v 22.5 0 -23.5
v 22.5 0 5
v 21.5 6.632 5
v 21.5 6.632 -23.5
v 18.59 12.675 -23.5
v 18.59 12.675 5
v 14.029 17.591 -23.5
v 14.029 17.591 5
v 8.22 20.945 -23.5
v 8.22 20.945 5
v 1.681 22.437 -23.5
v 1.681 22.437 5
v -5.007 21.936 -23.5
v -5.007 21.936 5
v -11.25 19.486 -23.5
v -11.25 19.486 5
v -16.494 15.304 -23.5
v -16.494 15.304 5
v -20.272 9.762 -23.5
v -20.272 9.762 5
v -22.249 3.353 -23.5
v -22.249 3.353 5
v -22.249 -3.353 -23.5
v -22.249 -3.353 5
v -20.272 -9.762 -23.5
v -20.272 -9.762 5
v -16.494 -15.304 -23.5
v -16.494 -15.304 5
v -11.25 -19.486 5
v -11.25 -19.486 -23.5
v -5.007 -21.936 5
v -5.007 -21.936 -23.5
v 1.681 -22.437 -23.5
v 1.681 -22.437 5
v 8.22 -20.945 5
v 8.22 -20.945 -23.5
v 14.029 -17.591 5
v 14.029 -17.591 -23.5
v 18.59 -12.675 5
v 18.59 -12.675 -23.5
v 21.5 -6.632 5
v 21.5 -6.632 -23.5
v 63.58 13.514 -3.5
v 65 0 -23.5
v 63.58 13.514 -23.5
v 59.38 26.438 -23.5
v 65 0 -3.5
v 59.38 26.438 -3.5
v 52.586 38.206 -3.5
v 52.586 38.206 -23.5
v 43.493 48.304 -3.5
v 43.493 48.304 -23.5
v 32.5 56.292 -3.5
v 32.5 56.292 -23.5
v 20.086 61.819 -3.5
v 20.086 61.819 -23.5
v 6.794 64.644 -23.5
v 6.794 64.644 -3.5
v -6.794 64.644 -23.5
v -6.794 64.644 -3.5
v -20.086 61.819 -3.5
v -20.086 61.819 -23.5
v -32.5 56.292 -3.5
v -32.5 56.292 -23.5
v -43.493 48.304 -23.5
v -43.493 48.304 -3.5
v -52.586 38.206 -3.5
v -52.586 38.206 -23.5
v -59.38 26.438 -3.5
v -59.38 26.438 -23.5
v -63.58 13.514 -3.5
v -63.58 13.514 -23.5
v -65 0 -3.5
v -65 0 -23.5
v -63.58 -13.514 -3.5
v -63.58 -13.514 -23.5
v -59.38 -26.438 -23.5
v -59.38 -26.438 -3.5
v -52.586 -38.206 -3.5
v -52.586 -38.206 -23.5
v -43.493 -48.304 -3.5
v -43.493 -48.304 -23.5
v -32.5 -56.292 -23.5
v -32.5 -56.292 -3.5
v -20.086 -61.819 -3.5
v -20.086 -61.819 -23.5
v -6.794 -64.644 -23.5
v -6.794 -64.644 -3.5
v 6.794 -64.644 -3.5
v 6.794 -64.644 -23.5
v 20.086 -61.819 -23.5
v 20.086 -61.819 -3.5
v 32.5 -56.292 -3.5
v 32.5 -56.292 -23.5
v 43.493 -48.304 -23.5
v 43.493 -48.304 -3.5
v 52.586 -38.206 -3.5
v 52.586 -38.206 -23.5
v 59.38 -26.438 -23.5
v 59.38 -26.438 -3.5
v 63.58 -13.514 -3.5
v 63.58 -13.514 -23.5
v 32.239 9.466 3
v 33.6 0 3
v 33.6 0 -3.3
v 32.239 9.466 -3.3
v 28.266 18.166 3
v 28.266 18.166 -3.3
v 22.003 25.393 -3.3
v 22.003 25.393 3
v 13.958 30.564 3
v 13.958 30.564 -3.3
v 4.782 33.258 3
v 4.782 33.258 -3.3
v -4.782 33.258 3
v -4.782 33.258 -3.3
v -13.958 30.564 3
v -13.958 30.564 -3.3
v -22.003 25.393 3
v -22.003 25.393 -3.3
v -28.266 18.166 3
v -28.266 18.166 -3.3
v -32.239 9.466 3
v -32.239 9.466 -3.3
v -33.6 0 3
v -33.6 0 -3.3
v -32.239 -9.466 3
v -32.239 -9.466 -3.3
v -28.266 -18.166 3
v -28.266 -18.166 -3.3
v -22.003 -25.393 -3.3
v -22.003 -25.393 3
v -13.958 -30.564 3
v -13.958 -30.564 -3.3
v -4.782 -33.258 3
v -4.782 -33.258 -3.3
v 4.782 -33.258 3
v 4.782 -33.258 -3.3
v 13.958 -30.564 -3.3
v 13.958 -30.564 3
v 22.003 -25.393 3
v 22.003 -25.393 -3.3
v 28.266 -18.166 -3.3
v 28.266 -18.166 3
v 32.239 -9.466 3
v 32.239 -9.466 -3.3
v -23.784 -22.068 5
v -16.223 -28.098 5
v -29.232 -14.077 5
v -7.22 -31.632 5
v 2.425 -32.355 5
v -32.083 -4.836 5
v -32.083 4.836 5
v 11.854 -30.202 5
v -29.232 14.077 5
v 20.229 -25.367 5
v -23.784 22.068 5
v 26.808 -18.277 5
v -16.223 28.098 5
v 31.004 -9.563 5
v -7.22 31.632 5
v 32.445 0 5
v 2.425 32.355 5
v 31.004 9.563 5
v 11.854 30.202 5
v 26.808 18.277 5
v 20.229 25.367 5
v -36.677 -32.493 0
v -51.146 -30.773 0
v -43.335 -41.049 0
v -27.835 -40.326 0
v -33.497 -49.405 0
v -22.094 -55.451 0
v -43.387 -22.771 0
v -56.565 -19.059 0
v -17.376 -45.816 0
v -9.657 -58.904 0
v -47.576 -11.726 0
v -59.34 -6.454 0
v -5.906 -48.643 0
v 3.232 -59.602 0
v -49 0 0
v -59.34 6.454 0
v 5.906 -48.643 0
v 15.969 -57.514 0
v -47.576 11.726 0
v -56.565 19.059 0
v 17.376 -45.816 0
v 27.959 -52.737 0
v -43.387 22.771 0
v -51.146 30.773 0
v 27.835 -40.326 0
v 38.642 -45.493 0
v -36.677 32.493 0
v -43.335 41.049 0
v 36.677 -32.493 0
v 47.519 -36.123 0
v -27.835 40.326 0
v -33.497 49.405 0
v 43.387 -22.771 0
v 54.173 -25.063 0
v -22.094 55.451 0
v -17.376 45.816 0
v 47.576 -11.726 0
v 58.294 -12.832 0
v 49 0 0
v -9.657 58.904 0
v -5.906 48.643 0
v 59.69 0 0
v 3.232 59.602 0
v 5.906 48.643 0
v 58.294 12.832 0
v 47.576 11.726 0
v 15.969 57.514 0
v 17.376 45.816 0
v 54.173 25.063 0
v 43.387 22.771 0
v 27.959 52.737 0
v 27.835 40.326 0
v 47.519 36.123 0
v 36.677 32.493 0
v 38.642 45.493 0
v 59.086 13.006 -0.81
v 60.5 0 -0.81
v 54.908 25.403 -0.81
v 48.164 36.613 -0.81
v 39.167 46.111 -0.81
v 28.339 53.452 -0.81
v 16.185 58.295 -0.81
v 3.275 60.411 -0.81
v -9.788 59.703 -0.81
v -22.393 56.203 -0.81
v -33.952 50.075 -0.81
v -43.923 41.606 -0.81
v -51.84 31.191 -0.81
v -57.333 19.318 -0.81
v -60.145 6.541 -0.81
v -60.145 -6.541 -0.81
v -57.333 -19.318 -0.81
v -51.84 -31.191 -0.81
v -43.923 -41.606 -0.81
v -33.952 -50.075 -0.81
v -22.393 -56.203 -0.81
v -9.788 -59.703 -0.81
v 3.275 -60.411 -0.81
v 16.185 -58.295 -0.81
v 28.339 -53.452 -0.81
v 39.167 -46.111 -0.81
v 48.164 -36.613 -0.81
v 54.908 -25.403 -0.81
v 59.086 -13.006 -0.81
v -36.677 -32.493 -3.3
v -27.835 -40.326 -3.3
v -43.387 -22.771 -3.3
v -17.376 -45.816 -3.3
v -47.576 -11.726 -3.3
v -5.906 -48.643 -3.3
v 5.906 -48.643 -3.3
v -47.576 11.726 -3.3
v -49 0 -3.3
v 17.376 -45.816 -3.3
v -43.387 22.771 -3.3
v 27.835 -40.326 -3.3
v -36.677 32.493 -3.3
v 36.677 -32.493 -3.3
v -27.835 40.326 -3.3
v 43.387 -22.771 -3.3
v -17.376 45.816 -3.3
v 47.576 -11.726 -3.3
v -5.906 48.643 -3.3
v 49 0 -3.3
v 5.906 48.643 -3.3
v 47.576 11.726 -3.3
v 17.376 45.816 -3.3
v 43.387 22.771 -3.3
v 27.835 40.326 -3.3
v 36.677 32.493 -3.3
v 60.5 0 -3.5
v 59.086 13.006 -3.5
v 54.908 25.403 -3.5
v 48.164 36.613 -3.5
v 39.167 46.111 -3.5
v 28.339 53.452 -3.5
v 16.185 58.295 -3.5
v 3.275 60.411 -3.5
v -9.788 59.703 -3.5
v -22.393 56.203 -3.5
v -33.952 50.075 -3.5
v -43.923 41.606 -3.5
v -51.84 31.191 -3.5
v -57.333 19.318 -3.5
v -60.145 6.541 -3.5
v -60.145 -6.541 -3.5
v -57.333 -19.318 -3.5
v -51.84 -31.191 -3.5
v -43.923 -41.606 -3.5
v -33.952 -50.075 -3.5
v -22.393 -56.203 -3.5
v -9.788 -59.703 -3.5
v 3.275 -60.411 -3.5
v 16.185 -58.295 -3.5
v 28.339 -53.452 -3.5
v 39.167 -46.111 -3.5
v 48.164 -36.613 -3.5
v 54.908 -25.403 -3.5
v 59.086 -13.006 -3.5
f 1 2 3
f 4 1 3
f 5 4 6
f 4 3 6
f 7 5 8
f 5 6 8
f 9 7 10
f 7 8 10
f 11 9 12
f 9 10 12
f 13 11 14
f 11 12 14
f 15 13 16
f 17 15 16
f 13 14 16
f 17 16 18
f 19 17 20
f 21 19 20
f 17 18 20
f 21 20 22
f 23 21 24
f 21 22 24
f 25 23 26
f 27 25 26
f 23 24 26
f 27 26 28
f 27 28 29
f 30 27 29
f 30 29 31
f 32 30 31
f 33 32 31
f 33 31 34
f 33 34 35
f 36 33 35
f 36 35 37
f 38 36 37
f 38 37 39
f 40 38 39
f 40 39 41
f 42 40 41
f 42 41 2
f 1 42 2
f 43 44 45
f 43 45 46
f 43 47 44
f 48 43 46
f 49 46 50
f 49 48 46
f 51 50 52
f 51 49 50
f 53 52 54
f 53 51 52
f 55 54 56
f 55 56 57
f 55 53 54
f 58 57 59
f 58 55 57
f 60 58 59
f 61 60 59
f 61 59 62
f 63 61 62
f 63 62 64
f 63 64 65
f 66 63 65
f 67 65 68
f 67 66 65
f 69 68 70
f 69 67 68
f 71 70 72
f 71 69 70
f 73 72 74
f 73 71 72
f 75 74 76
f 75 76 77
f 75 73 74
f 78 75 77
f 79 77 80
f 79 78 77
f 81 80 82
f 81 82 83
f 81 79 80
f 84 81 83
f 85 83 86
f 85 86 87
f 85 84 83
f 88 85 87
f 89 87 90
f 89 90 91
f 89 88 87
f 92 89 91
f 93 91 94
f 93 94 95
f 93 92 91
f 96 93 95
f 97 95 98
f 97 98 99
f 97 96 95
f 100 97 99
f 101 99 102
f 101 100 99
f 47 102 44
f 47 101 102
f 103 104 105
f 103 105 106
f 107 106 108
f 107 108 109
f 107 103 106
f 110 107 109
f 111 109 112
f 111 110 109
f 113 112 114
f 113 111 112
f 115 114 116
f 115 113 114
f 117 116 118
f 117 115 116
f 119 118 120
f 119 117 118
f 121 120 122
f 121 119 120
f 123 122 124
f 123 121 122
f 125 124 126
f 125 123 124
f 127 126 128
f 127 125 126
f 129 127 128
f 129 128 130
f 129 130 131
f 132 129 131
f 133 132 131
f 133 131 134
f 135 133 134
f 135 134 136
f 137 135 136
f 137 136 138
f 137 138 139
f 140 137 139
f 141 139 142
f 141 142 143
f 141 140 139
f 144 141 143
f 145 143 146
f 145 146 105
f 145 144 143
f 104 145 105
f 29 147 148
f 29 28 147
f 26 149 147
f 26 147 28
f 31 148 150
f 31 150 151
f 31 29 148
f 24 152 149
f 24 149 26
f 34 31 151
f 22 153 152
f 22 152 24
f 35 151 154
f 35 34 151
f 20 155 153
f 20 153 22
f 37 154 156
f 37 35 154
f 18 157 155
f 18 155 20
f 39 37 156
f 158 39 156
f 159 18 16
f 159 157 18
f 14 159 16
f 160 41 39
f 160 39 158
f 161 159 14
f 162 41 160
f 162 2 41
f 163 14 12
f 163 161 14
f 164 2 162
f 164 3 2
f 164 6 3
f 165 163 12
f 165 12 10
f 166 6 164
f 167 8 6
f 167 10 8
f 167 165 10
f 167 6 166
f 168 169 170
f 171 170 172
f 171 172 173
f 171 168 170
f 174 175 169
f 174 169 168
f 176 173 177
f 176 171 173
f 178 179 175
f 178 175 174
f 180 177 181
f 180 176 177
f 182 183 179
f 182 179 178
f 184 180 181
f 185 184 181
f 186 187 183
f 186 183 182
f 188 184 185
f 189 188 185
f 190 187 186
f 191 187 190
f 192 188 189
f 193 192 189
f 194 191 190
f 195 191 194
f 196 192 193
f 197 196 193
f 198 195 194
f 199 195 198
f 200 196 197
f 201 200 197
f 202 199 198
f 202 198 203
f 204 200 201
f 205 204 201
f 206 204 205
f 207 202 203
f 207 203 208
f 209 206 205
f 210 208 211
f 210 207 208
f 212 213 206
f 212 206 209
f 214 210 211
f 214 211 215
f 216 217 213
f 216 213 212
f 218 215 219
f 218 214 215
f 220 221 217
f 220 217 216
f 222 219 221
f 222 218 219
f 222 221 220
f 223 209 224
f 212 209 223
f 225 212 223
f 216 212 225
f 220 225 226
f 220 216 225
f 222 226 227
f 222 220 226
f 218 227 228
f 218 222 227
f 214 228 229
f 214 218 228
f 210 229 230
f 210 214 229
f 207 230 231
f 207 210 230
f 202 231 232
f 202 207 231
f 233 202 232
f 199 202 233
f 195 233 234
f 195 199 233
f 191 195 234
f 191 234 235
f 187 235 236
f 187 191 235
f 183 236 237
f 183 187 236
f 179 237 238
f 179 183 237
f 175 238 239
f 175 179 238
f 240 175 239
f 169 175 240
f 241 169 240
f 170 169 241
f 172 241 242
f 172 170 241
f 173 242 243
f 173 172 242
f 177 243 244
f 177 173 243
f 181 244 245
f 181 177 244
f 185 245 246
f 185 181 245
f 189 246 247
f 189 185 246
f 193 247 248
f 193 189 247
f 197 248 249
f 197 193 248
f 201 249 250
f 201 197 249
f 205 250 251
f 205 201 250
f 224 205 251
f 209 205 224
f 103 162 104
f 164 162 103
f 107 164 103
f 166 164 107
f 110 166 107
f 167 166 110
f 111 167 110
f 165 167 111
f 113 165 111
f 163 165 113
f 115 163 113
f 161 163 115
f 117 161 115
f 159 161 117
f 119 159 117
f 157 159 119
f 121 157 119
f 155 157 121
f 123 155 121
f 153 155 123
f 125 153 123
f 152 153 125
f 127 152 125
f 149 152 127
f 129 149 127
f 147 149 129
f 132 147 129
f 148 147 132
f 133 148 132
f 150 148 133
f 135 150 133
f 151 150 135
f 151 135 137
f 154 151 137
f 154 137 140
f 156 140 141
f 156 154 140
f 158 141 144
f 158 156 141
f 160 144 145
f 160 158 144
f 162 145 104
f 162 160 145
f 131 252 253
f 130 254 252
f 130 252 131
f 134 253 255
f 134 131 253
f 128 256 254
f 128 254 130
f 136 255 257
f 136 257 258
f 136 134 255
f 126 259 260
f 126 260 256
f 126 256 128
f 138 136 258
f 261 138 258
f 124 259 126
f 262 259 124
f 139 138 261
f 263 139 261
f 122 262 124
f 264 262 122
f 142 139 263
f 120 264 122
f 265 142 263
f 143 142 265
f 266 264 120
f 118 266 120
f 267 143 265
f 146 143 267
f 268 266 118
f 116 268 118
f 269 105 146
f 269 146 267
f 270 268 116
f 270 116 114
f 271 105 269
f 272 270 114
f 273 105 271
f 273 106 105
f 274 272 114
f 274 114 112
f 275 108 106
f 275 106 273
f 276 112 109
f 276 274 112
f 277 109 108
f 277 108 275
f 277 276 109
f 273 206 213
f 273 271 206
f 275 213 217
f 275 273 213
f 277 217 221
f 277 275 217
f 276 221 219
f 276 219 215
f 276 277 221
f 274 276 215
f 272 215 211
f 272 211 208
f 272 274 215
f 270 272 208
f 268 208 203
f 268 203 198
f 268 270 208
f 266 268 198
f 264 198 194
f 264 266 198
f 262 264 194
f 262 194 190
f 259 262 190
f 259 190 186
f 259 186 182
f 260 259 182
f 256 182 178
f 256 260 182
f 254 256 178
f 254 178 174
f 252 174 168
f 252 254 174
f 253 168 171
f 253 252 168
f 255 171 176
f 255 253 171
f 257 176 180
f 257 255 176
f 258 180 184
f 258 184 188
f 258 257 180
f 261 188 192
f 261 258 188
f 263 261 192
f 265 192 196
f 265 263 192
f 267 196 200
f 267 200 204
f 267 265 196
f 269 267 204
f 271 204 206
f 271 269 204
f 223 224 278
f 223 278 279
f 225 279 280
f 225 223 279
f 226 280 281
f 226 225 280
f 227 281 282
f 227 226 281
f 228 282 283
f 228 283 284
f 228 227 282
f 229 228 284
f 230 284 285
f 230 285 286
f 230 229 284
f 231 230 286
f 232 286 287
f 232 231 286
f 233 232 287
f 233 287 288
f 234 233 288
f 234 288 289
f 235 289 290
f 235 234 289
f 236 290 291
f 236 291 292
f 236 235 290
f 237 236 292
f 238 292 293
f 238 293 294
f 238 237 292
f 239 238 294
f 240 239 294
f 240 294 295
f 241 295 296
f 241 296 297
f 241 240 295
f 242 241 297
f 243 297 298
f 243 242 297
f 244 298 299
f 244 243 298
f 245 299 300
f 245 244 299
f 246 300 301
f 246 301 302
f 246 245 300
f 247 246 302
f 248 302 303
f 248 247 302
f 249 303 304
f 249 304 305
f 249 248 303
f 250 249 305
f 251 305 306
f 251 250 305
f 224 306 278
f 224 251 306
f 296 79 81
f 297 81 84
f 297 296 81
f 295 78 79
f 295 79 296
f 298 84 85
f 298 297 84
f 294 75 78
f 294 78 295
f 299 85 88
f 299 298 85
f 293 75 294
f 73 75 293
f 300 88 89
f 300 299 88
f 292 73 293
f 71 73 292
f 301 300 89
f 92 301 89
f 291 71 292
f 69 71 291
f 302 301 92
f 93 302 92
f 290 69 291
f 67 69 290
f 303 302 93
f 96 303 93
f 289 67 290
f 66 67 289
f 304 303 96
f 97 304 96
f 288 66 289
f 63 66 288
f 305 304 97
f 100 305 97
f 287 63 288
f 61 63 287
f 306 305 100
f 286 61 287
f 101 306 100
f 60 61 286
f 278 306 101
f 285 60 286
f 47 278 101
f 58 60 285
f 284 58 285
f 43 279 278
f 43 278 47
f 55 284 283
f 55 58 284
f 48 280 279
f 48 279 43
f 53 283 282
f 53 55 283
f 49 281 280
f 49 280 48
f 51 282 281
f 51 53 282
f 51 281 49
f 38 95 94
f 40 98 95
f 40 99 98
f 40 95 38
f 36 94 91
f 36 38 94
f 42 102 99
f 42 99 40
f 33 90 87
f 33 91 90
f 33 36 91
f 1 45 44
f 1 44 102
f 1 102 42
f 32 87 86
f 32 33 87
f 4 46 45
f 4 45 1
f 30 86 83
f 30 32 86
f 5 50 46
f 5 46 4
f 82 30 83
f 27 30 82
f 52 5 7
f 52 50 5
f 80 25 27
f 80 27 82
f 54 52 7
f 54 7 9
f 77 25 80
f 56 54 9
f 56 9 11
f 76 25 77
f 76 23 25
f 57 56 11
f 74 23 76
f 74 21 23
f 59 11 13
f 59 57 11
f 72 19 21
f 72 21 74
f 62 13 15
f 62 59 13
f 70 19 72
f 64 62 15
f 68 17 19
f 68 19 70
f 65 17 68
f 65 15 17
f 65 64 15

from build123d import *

# Parameters (mm, degrees)
F2_SIZE       = 0.81
F3_SIZE2      = 1.154701
F3_SIZE       = 2
F4_R          = 22.5
F5_DEPTH      = 50
F5_DEPTH_BACK = 16.8


with BuildPart() as f1:
    # F0 (on Front) → F1 (revolve)
    with BuildSketch(Plane.XZ):
        Polygon((0, 0), (0, -23.5), (65, -23.5), (65, -3.5), (60.5, -3.5), (60.5, 0), (49, 0), (49, -3.3), (33.6, -3.3), (33.6, 5), (0, 5), align=None)
    revolve(axis=Axis((0, 0, 20), (0, 0, 1)))

    # F2
    f2_edges = [f1.edges().sort_by_distance(p)[0] for p in [
        (-60.5, 0, 0),
    ]]
    chamfer(f2_edges, length=F2_SIZE)

    # F3
    f3_edges = [f1.edges().sort_by_distance(p)[0] for p in [
        (-33.6, 0, 5),
    ]]
    chamfer(f3_edges, length=F3_SIZE, length2=F3_SIZE2)


with BuildPart() as f5:
    # F4 (on face) → F5 (new body, two sides)
    with BuildSketch(Plane.XY.offset(5)) as f5_sk:
        Circle(F4_R)
    extrude(amount=-F5_DEPTH)
    extrude(f5_sk.sketch, amount=-F5_DEPTH_BACK)


with BuildPart() as f1_1:
    add(f1.part)

    # F6: cut F5
    add(f5.part, mode=Mode.SUBTRACT)


solid = f1_1.part
